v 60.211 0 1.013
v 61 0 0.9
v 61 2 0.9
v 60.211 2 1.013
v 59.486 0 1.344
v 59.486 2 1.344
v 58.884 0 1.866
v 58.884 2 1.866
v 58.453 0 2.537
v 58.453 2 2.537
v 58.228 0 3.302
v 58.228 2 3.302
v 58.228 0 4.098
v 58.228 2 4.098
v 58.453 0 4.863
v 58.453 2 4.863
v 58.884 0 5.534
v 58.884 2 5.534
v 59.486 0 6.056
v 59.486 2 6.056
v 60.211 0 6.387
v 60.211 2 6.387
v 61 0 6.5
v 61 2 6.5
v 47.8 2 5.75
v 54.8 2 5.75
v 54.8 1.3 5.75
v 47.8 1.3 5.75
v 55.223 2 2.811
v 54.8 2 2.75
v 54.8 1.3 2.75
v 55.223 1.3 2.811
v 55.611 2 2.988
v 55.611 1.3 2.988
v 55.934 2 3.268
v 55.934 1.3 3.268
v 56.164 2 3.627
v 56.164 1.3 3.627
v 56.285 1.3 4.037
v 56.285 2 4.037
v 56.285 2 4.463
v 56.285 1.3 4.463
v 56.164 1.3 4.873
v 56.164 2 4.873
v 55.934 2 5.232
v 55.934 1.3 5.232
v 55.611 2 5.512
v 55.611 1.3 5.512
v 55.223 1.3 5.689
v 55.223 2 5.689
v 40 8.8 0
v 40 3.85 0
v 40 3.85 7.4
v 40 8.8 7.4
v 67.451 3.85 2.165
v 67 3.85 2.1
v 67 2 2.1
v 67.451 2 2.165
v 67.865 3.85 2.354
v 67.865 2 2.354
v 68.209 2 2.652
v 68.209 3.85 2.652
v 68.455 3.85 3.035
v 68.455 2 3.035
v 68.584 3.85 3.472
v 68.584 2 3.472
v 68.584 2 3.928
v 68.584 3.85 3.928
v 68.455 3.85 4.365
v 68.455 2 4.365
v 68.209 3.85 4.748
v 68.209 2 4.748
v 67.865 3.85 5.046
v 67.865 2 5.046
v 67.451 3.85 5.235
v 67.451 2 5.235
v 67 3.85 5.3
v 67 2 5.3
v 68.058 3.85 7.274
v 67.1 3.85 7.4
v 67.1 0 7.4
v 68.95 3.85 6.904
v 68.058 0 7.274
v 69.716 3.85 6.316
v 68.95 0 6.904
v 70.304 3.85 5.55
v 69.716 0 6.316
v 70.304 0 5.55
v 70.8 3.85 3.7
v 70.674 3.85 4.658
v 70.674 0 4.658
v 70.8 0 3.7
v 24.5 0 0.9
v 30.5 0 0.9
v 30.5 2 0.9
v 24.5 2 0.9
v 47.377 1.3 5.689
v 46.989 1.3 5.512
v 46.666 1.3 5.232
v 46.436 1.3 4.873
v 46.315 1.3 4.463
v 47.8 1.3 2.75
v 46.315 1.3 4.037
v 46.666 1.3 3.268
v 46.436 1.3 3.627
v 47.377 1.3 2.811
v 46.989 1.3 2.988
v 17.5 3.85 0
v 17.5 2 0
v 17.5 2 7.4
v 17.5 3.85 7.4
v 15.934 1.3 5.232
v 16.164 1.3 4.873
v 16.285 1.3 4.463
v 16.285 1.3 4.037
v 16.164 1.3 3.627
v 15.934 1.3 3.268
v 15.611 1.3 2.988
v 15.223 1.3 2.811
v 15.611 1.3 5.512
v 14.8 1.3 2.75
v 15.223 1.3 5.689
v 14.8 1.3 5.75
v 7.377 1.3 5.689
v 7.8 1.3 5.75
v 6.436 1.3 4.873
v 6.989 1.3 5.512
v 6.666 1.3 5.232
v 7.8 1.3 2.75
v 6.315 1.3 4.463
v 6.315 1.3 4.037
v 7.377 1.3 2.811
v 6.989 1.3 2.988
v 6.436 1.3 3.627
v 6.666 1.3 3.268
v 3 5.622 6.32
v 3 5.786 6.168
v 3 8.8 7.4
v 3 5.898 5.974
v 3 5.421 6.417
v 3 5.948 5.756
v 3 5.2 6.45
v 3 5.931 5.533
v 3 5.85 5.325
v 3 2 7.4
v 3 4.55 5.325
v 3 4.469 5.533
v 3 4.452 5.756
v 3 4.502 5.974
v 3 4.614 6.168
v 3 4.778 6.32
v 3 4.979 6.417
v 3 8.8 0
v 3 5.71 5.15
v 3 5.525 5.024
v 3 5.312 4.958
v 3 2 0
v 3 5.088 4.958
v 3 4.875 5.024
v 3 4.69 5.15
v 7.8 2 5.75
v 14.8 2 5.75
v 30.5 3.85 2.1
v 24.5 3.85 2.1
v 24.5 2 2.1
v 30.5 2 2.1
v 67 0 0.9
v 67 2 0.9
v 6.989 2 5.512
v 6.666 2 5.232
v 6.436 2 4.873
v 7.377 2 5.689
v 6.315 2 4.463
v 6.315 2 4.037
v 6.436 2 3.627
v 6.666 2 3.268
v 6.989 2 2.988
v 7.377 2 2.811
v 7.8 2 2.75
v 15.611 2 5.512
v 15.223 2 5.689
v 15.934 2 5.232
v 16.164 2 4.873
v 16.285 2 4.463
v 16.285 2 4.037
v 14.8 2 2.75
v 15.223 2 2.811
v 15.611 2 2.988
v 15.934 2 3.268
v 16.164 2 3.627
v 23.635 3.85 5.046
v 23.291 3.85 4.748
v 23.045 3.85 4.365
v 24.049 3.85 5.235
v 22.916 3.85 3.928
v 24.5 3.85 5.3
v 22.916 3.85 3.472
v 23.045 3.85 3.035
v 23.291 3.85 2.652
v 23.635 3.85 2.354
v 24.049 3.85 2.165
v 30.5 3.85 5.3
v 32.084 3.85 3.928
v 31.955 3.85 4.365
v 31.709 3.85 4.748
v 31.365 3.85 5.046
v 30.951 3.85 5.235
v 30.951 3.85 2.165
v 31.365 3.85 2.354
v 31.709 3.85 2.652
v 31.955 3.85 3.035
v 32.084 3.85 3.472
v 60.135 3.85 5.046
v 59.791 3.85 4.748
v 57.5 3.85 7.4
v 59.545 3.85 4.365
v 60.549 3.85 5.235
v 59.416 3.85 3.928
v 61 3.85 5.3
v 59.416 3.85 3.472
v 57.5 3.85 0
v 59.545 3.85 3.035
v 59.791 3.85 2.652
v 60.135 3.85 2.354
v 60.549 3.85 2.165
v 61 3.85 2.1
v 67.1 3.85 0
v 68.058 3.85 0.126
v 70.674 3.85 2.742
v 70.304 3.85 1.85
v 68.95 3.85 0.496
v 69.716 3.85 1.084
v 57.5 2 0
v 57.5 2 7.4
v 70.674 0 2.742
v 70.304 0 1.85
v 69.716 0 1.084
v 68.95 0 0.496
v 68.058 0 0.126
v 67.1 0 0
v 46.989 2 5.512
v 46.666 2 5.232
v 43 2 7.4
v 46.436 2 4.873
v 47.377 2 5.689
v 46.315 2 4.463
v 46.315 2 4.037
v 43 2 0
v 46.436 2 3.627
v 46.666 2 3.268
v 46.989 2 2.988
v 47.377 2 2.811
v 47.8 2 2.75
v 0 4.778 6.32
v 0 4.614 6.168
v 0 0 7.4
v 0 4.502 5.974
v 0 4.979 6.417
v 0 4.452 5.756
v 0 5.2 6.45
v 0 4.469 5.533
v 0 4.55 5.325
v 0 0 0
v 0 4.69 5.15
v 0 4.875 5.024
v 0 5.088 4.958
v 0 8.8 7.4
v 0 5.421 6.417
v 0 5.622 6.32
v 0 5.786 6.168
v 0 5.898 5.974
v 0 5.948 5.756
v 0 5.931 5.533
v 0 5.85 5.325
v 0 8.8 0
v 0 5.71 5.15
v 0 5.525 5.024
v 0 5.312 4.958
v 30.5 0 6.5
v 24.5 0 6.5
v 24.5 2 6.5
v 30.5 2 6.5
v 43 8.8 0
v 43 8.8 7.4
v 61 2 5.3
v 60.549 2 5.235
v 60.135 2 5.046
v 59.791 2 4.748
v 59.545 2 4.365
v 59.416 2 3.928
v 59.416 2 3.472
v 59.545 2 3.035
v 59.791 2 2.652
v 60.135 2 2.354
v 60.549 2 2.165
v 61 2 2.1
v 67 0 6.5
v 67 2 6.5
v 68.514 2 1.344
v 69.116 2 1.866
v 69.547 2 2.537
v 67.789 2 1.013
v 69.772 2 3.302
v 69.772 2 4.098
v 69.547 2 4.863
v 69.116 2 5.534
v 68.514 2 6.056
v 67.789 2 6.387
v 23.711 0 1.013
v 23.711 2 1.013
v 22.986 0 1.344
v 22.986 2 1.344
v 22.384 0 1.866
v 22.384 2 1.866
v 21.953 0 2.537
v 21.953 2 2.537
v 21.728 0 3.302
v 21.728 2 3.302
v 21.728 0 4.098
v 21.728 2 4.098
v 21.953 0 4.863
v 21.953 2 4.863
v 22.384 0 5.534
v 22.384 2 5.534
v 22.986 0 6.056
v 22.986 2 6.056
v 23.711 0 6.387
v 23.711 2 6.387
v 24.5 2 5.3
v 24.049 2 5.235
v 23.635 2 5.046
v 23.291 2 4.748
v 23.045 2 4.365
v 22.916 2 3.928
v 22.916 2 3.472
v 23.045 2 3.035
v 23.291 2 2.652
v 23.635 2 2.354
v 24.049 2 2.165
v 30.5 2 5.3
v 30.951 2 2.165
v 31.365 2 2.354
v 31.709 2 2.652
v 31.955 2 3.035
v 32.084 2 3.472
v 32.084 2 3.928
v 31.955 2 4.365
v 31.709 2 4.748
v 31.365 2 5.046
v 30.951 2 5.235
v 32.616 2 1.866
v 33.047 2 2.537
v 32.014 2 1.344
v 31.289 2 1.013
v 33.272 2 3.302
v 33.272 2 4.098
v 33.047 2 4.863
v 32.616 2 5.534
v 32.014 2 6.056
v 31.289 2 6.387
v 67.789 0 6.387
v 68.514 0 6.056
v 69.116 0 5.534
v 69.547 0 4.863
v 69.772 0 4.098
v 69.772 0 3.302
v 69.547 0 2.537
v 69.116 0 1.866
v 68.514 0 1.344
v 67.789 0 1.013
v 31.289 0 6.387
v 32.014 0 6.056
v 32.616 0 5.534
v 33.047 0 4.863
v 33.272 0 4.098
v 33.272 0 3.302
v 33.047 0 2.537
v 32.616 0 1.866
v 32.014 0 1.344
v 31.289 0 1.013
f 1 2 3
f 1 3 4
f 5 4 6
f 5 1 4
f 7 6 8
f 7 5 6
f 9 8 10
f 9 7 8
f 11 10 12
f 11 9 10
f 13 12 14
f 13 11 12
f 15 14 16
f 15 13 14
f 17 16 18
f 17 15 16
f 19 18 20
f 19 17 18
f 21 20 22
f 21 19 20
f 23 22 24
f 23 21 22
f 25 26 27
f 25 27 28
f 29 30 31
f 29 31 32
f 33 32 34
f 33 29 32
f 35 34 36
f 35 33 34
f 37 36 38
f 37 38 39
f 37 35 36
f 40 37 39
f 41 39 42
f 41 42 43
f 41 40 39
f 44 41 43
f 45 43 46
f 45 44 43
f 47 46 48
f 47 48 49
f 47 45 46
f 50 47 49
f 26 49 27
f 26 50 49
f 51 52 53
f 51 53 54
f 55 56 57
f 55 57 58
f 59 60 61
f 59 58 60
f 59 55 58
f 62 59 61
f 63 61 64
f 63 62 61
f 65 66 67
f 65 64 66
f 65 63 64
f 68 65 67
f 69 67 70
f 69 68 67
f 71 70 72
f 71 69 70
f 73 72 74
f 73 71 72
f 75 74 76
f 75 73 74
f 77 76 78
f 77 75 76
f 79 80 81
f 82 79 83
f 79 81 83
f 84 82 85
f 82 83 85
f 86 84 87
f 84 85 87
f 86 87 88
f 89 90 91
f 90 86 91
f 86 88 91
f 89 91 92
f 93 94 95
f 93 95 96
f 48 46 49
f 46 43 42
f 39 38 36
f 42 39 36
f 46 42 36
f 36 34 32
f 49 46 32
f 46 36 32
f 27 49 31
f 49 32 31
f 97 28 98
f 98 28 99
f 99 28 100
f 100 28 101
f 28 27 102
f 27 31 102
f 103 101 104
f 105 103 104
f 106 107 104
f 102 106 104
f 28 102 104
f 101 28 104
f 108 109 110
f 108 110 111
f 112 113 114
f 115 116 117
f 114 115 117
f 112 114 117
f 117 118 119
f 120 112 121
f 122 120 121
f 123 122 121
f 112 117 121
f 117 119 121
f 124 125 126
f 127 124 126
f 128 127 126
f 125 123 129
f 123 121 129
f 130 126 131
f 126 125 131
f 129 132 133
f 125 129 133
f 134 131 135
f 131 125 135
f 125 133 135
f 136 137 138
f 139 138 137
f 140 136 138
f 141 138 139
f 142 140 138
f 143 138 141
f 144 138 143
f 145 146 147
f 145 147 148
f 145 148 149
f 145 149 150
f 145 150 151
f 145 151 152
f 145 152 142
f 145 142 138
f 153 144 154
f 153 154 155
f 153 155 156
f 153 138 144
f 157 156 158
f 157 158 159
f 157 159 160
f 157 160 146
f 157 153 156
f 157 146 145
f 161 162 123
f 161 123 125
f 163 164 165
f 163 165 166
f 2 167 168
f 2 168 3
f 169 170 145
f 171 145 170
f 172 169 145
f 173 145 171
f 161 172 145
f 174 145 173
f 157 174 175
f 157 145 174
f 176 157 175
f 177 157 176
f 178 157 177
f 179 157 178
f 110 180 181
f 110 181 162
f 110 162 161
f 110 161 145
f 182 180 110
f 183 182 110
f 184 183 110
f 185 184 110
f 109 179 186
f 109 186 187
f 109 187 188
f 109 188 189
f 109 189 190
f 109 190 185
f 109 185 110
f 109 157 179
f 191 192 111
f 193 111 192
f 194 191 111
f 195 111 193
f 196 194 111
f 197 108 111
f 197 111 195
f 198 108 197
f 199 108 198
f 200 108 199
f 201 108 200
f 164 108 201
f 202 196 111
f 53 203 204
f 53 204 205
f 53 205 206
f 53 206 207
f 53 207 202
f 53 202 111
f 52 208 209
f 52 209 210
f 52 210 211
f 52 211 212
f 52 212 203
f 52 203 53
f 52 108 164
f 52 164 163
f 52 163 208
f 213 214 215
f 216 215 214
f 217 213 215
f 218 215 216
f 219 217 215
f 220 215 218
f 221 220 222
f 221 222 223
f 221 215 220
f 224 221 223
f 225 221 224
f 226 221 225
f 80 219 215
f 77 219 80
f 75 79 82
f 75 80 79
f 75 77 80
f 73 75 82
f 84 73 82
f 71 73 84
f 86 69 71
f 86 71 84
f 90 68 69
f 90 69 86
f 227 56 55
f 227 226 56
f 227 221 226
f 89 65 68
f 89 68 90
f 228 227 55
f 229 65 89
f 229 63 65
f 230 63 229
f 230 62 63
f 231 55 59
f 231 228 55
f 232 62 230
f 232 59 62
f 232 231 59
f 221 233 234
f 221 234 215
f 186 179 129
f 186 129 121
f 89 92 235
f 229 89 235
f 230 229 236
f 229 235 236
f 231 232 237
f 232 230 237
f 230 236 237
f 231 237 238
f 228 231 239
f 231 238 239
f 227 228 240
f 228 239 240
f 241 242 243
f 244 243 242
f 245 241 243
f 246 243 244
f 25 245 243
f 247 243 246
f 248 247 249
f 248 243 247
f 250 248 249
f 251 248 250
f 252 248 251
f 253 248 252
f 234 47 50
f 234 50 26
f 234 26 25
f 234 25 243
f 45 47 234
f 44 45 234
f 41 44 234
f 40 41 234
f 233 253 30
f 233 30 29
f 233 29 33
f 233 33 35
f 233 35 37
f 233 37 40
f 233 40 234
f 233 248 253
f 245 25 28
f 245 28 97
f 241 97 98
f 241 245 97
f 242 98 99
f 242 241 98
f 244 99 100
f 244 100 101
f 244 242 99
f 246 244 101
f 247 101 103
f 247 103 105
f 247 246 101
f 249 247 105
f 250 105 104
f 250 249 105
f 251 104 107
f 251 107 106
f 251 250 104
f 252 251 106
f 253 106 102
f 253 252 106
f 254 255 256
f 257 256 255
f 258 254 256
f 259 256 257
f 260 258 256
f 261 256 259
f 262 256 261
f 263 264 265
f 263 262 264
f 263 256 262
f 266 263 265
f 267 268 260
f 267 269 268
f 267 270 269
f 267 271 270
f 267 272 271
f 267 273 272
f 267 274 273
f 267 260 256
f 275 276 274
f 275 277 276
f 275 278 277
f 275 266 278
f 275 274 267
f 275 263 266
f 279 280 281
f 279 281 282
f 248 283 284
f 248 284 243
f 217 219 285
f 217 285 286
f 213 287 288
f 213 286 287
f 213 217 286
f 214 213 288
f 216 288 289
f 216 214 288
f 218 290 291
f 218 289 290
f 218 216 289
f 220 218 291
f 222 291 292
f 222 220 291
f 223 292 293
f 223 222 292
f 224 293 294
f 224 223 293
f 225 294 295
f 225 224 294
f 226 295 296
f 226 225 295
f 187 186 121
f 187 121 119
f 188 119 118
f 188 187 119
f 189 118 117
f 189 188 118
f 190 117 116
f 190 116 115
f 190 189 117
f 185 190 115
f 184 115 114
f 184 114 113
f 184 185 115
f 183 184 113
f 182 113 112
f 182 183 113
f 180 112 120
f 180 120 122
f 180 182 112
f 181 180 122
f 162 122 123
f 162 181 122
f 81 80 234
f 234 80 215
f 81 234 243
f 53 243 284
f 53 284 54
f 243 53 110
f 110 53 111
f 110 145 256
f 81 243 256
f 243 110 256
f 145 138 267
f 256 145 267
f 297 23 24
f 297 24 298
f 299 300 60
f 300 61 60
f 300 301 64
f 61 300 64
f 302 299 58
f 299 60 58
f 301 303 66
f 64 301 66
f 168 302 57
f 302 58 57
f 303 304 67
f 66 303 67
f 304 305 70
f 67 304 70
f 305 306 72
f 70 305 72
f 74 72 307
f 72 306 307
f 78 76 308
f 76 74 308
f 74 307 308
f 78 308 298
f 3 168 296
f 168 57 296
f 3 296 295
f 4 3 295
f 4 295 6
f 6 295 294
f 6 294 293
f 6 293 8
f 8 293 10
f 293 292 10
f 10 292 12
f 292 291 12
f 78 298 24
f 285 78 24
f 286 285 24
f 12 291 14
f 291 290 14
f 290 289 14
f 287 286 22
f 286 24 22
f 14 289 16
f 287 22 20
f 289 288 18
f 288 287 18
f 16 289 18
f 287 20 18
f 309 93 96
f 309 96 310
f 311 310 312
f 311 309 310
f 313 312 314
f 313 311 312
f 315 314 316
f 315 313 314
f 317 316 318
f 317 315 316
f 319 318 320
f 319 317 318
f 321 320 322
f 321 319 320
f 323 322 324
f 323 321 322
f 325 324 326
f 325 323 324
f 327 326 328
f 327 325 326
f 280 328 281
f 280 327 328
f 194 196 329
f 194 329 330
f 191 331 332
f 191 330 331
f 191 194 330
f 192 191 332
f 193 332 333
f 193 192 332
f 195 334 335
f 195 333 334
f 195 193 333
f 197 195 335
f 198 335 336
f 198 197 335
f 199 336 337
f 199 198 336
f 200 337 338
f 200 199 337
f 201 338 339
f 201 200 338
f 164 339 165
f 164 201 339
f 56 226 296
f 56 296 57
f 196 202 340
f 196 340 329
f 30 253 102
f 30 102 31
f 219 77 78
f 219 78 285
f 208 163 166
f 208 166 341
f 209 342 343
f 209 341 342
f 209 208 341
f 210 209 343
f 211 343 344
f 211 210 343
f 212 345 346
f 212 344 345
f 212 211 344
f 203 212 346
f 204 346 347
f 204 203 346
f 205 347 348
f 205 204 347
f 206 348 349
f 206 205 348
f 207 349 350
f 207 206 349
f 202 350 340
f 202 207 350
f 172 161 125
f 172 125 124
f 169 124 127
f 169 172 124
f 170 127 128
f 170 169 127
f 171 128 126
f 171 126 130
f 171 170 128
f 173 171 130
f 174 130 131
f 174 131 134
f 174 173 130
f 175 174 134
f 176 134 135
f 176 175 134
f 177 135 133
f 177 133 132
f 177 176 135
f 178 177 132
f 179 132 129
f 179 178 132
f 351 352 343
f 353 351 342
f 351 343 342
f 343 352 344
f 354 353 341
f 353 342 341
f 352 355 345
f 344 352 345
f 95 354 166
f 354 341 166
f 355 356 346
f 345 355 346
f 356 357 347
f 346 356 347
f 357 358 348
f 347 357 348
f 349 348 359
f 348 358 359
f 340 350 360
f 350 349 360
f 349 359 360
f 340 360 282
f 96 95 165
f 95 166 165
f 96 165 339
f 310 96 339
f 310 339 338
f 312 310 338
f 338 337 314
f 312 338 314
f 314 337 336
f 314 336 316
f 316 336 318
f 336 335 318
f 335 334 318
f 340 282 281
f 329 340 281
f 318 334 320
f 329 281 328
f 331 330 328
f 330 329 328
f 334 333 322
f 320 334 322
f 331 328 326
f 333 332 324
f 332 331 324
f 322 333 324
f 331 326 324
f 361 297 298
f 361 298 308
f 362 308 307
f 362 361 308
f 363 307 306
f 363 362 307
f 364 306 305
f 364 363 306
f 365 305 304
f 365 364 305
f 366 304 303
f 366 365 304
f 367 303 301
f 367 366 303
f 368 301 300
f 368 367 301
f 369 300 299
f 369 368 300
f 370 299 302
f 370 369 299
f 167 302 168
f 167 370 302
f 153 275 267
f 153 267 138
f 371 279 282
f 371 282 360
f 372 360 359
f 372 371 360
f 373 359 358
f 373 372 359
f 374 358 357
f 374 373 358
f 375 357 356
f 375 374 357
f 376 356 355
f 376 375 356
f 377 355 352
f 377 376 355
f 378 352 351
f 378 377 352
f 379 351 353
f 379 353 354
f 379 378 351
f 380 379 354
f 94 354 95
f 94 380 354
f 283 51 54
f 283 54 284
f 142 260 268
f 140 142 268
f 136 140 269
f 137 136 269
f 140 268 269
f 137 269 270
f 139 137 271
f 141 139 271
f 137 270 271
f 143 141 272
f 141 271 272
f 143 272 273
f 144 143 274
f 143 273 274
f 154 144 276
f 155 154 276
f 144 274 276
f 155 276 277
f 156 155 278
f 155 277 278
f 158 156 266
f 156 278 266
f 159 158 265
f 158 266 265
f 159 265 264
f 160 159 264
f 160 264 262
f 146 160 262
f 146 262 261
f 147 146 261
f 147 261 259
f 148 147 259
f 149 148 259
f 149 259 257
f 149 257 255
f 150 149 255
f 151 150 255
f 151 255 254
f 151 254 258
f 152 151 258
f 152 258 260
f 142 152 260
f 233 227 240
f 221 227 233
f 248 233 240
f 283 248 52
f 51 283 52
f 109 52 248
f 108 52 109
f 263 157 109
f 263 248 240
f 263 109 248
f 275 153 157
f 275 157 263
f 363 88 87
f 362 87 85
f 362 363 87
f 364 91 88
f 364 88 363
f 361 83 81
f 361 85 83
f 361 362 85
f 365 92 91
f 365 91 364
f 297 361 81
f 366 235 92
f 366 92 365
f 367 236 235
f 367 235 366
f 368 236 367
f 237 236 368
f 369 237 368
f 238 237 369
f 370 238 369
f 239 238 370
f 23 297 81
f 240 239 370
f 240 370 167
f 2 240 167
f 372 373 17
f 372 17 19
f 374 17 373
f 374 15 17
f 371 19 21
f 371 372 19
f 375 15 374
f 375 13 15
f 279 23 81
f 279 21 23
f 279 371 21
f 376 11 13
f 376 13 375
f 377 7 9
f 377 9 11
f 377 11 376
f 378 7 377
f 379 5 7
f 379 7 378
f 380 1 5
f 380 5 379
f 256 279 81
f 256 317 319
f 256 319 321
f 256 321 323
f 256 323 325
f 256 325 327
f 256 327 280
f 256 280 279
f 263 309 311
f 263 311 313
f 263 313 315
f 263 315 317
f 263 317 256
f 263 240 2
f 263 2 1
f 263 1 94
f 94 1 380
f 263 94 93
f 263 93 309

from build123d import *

# Parameters (mm, degrees)
BOSS_EXTRUDE1_DEPTH = 7.4
CUT_EXTRUDE1_DEPTH  = 10
CUT_EXTRUDE2_DEPTH  = 2
CUT_EXTRUDE3_REACH  = 72.8
SKETCH5_R           = 0.75
CUT_EXTRUDE4_DEPTH  = 10
CUT_EXTRUDE6_DEPTH  = 0.7


with BuildPart() as part:
    # Sketch1 → Boss-Extrude1 (new body)
    with BuildSketch(Plane.XY):
        Polygon((0, 0), (0, 8.8), (3, 8.8), (3, 2), (17.5, 2), (17.5, 3.85), (40, 3.85), (40, 8.8), (43, 8.8), (43, 2), (57.5, 2), (57.5, 3.85), (70.8, 3.85), (70.8, 0), align=None)
    extrude(amount=BOSS_EXTRUDE1_DEPTH)

    # Sketch3 → Cut-Extrude1 (cut)
    with BuildSketch(Plane(origin=(0, 3.85, 0), x_dir=(1, 0, 0), z_dir=(0, 1, 0))):
        with BuildLine():
            Line((30.5, -5.3), (24.5, -5.3))
            ThreePointArc((24.5, -5.3), (22.9, -3.7), (24.5, -2.1))
            Line((24.5, -2.1), (30.5, -2.1))
            ThreePointArc((30.5, -2.1), (32.1, -3.7), (30.5, -5.3))
        make_face()
        with BuildLine():
            Line((67, -5.3), (61, -5.3))
            ThreePointArc((61, -5.3), (59.4, -3.7), (61, -2.1))
            Line((61, -2.1), (67, -2.1))
            ThreePointArc((67, -2.1), (68.6, -3.7), (67, -5.3))
        make_face()
    extrude(amount=-CUT_EXTRUDE1_DEPTH, mode=Mode.SUBTRACT)

    # Sketch4 → Cut-Extrude2 (cut)
    with BuildSketch(Plane.XZ):
        with BuildLine():
            Line((24.5, 6.5), (30.5, 6.5))
            ThreePointArc((30.5, 6.5), (33.3, 3.7), (30.5, 0.9))
            Line((30.5, 0.9), (24.5, 0.9))
            ThreePointArc((24.5, 0.9), (21.7, 3.7), (24.5, 6.5))
        make_face()
        with BuildLine():
            Line((24.5, 5.3), (30.5, 5.3))
            ThreePointArc((30.5, 5.3), (32.1, 3.7), (30.5, 2.1))
            Line((30.5, 2.1), (24.5, 2.1))
            ThreePointArc((24.5, 2.1), (22.9, 3.7), (24.5, 5.3))
        make_face(mode=Mode.SUBTRACT)
        with BuildLine():
            Line((61, 6.5), (67, 6.5))
            ThreePointArc((67, 6.5), (69.8, 3.7), (67, 0.9))
            Line((67, 0.9), (61, 0.9))
            ThreePointArc((61, 0.9), (58.2, 3.7), (61, 6.5))
        make_face()
        with BuildLine():
            Line((61, 5.3), (67, 5.3))
            ThreePointArc((67, 5.3), (68.6, 3.7), (67, 2.1))
            Line((67, 2.1), (61, 2.1))
            ThreePointArc((61, 2.1), (59.4, 3.7), (61, 5.3))
        make_face(mode=Mode.SUBTRACT)
    extrude(amount=-CUT_EXTRUDE2_DEPTH, mode=Mode.SUBTRACT)

    # Sketch5 → Cut-Extrude3 (cut, up to next)
    with BuildSketch(Plane.ZY, mode=Mode.PRIVATE) as cut_extrude3_sk1:
        with Locations((5.7, 5.2)):
            Circle(SKETCH5_R)
    cut_extrude3_tool1 = extrude(cut_extrude3_sk1.sketch, amount=-CUT_EXTRUDE3_REACH, mode=Mode.PRIVATE) & part.part
    add(cut_extrude3_tool1.solids().sort_by_distance((0, 5.2, 5.7))[0], mode=Mode.SUBTRACT)

    # Sketch6 → Cut-Extrude4 (cut)
    with BuildSketch(Plane.XZ):
        with BuildLine():
            Line((67.1, 0), (70.8, 0))
            Line((70.8, 0), (70.8, 3.7))
            ThreePointArc((70.8, 3.7), (69.71629509, 1.08370491), (67.1, 0))
        make_face()
        with BuildLine():
            ThreePointArc((67.1, 7.4), (69.71629509, 6.31629509), (70.8, 3.7))
            Line((70.8, 3.7), (70.8, 7.4))
            Line((70.8, 7.4), (67.1, 7.4))
        make_face()
    extrude(amount=-CUT_EXTRUDE4_DEPTH, mode=Mode.SUBTRACT)

    # Sketch8 → Cut-Extrude6 (cut)
    with BuildSketch(Plane(origin=(0, 2, 0), x_dir=(1, 0, 0), z_dir=(0, 1, 0))):
        with BuildLine():
            Line((7.8, -2.75), (14.8, -2.75))
            ThreePointArc((14.8, -2.75), (16.3, -4.25), (14.8, -5.75))
            Line((14.8, -5.75), (7.8, -5.75))
            ThreePointArc((7.8, -5.75), (6.3, -4.25), (7.8, -2.75))
        make_face()
        with BuildLine():
            Line((47.8, -2.75), (54.8, -2.75))
            ThreePointArc((54.8, -2.75), (56.3, -4.25), (54.8, -5.75))
            Line((54.8, -5.75), (47.8, -5.75))
            ThreePointArc((47.8, -5.75), (46.3, -4.25), (47.8, -2.75))
        make_face()
    extrude(amount=-CUT_EXTRUDE6_DEPTH, mode=Mode.SUBTRACT)


solid = part.part
